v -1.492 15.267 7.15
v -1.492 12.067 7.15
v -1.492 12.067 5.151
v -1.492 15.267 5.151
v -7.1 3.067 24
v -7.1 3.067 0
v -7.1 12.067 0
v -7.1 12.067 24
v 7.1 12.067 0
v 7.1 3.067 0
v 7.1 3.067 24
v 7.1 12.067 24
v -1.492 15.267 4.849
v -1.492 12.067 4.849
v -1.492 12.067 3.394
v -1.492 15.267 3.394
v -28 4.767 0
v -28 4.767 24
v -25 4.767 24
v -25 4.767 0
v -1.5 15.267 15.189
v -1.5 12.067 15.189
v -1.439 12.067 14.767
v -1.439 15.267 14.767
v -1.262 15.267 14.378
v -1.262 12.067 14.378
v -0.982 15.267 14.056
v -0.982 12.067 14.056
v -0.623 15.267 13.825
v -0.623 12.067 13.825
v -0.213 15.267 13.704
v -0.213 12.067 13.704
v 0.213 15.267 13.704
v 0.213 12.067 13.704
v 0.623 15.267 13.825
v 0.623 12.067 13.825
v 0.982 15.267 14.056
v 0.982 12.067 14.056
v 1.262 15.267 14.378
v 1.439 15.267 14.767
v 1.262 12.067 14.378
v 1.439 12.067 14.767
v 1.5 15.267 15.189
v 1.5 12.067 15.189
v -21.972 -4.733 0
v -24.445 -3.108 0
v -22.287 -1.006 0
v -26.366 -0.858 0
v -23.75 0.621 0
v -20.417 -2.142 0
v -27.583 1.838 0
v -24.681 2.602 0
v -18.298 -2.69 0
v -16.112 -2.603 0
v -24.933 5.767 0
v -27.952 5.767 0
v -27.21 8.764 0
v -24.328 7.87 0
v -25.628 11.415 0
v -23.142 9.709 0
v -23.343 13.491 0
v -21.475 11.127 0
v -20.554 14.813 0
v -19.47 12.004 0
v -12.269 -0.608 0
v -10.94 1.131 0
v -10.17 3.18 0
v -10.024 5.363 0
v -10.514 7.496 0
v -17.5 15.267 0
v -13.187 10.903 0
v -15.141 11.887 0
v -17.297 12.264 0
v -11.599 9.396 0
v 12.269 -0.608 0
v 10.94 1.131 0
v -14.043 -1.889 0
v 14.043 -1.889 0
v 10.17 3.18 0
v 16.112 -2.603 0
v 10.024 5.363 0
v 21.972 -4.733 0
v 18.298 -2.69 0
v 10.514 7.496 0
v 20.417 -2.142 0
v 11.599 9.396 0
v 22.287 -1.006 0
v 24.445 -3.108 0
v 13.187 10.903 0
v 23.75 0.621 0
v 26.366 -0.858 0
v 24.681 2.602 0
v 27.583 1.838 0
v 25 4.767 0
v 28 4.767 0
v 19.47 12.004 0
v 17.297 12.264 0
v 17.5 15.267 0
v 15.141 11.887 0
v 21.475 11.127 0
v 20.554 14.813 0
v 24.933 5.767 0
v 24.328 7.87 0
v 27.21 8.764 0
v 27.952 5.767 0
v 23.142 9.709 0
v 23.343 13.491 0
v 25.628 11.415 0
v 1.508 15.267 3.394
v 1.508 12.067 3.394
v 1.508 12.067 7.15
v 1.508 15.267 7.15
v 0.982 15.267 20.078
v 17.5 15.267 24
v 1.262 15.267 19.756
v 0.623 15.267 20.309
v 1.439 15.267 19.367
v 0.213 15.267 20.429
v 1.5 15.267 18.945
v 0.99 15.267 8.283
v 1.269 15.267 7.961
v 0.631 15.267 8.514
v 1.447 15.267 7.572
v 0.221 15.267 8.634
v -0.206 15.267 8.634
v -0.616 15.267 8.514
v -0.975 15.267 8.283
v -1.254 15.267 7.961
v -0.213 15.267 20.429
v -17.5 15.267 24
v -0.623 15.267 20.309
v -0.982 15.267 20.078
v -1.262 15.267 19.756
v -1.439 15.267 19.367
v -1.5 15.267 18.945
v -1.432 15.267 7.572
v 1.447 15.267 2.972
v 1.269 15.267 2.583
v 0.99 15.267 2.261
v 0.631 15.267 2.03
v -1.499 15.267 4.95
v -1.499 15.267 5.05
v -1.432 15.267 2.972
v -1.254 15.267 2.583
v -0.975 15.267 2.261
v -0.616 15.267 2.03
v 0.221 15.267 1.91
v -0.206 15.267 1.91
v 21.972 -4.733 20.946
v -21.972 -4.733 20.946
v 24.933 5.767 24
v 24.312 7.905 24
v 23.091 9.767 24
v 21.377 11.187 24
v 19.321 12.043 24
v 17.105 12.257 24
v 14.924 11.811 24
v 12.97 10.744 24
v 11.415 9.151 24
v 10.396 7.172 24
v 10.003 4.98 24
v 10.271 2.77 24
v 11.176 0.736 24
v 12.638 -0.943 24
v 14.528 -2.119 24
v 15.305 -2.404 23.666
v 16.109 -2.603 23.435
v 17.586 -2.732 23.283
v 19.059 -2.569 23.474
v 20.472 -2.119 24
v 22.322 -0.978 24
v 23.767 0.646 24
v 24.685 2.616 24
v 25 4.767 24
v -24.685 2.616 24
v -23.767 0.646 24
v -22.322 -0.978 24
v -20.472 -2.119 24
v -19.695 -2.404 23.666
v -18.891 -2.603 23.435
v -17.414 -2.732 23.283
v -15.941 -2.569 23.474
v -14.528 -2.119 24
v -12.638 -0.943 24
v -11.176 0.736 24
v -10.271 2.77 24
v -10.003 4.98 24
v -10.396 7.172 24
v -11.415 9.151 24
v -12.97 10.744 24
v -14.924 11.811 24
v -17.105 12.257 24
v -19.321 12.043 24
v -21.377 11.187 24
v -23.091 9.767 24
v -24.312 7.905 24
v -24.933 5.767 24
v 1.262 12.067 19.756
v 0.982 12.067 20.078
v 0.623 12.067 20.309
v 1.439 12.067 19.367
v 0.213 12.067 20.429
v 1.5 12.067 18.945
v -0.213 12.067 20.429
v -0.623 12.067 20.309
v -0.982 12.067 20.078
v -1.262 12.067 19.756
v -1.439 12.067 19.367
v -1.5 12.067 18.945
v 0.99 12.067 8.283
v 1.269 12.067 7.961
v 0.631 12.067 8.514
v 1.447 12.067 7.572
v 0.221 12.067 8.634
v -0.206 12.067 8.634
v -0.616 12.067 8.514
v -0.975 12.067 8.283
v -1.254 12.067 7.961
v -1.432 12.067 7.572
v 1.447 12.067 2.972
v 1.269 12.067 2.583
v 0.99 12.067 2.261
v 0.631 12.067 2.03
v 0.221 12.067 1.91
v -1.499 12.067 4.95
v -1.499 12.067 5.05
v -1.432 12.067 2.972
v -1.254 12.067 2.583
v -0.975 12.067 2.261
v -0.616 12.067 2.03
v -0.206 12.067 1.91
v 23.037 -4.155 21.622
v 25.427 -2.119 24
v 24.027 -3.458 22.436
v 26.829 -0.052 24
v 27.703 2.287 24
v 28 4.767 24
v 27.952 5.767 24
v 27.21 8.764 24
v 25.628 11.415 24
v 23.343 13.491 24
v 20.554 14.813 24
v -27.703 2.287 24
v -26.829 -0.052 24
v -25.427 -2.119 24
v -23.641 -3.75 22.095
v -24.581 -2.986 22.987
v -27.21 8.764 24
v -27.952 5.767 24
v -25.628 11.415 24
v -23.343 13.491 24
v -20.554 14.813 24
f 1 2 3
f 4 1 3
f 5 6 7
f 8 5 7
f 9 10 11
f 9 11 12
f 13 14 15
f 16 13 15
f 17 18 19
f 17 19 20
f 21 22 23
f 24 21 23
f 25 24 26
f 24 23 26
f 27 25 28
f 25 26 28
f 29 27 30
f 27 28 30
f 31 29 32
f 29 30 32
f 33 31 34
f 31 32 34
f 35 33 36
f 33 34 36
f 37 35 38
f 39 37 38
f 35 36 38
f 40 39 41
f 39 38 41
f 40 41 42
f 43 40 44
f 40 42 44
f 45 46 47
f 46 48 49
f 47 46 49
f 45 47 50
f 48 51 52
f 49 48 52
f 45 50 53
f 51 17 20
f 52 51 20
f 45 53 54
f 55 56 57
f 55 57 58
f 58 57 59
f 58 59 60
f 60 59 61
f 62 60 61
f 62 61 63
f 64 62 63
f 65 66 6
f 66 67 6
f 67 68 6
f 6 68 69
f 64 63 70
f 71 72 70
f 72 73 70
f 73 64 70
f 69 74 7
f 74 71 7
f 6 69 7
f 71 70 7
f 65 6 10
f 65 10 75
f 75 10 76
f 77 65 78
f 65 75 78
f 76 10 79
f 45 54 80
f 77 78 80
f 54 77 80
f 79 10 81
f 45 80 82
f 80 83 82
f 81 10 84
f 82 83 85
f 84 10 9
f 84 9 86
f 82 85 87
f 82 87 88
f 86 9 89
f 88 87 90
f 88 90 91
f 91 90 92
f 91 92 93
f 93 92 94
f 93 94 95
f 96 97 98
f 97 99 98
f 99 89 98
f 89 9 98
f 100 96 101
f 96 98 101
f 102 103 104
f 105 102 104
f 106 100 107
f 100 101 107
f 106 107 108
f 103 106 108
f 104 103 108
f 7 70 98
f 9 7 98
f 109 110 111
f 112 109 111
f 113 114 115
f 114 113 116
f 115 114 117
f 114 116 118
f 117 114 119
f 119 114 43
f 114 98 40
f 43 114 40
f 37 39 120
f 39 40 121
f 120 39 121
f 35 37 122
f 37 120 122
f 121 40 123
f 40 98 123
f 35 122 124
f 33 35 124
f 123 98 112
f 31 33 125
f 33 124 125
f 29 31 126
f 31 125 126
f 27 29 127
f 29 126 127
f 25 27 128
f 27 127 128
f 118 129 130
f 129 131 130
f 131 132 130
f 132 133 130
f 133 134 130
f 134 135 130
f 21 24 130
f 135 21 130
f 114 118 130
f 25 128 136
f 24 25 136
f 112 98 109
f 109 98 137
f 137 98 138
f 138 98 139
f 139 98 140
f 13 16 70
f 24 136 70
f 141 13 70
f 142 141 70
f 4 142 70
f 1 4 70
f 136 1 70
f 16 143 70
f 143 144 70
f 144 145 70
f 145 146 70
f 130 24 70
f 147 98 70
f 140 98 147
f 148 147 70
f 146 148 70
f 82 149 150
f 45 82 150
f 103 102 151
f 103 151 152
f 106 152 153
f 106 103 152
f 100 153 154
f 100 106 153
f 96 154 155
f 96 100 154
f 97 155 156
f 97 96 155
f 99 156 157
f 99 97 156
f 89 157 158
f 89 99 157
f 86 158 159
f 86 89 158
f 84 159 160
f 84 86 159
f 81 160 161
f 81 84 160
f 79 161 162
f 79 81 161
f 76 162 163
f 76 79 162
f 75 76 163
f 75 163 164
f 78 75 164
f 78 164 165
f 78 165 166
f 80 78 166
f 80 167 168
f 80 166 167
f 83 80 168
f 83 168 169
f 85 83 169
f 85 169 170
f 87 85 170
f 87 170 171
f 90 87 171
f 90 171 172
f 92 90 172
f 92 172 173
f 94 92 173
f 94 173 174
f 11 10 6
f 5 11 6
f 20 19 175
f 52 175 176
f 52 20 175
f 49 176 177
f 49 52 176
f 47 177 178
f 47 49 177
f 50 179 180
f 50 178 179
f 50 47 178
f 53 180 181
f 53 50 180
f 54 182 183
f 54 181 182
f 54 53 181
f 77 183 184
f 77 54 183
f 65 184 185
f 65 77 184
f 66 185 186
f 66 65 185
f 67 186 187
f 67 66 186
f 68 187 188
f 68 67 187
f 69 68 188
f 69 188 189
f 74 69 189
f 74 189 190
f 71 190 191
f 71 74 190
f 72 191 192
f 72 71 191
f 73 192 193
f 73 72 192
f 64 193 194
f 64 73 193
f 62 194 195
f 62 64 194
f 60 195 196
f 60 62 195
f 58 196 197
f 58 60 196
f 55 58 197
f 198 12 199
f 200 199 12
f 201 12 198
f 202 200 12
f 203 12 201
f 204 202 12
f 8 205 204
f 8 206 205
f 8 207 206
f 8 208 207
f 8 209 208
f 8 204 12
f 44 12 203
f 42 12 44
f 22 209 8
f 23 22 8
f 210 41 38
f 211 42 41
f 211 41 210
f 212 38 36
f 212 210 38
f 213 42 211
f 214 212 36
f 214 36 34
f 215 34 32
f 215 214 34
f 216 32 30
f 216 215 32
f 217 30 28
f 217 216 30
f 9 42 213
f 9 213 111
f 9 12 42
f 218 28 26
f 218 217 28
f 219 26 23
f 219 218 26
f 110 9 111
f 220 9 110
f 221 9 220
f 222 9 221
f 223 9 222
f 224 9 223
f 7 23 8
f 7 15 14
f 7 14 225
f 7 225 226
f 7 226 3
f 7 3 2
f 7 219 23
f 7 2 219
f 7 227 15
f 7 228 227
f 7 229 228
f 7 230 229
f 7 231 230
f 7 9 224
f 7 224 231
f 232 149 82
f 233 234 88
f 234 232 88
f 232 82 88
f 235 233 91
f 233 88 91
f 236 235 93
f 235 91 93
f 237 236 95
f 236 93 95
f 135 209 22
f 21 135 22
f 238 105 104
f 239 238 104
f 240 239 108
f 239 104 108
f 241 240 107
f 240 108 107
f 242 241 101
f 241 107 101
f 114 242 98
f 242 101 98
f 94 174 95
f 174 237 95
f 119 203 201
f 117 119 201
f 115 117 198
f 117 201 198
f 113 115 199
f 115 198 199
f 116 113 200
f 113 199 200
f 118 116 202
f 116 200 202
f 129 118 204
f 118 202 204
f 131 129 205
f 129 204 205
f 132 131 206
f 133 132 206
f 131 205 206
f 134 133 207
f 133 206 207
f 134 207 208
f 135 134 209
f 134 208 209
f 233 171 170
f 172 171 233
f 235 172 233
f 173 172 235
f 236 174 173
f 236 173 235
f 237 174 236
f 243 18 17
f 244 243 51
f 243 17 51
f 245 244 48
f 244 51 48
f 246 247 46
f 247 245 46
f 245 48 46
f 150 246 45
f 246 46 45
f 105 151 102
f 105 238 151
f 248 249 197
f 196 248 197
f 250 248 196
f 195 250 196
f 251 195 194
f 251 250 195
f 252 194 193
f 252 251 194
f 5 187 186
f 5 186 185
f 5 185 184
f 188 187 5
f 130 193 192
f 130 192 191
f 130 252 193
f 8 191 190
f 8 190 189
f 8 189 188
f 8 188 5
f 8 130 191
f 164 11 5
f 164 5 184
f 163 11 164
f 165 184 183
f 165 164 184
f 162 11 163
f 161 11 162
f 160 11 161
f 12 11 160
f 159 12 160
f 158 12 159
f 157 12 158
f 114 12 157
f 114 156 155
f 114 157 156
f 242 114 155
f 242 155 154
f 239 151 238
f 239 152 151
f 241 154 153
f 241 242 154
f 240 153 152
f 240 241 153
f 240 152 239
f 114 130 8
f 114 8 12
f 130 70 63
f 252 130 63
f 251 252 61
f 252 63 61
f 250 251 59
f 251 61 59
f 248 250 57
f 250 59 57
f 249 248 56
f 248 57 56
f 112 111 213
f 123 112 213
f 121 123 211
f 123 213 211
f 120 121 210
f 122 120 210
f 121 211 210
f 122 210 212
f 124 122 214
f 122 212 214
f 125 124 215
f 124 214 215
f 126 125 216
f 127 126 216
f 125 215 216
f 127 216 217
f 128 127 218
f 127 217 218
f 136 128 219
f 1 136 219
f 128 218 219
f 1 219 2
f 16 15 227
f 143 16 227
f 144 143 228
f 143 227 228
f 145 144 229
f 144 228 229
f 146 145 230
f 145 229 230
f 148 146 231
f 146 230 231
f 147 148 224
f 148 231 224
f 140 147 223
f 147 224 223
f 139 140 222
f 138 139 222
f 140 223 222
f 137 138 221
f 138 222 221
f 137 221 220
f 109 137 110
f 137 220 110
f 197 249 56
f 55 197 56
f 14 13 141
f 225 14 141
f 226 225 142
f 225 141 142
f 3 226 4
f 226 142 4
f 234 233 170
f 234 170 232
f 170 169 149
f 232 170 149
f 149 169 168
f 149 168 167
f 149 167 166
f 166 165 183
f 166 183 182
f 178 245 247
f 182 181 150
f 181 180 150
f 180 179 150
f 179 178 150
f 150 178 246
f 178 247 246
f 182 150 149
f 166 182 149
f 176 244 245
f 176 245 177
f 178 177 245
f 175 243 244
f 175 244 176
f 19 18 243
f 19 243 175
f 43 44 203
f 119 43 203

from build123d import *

# Parameters (mm, degrees)
SKETCH2_R               = 7.5
BOSS_EXTRUDE1_DEPTH     = 24
CUT_EXTRUDE2_DEPTH      = 40.913473307
CUT_EXTRUDE2_DEPTH_BACK = 40.913473307
SKETCH5_W               = 68.617197106
SKETCH5_H               = 1
SKETCH6_W               = 14.2
SKETCH6_H               = 9
CUT_EXTRUDE4_DEPTH      = 40.913473307
SKETCH7_R               = 1.5
CUT_EXTRUDE5_DEPTH      = 7
CUT_EXTRUDE6_DEPTH      = 40.913473307
CUT_EXTRUDE6_DEPTH_BACK = 40.913473307
SKETCH9_W               = 33.569510153
SKETCH9_H               = 1
CUT_EXTRUDE7_DEPTH      = 10
CUT_EXTRUDE8_DEPTH      = 42.952353927
CUT_EXTRUDE8_DEPTH_BACK = 6


with BuildPart() as part:
    # Sketch2 → Boss-Extrude1 (new body)
    with BuildSketch(Plane.XY):
        with BuildLine():
            Line((-17.5, -5.732866955), (-5, -5.732866955))
            Line((-5, -5.732866955), (17.5, -5.732866955))
            ThreePointArc((17.5, -5.732866955), (28, 4.767133045), (17.5, 15.267133045))
            Line((17.5, 15.267133045), (-17.5, 15.267133045))
            ThreePointArc((-17.5, 15.267133045), (-28, 4.767133045), (-17.5, -5.732866955))
        make_face()
        with Locations((-17.5, 4.767133045)):
            Circle(SKETCH2_R, mode=Mode.SUBTRACT)
        with Locations((17.5, 4.767133045)):
            Circle(SKETCH2_R, mode=Mode.SUBTRACT)
    extrude(amount=BOSS_EXTRUDE1_DEPTH)

    # Sketch5 → Cut-Extrude2 (cut, two sides: drawn at the far end of the back side and taken through both)
    with BuildSketch(Plane(origin=(0, 0, 0), x_dir=(-1, 0, 0), z_dir=(0, 0, -1)).offset(-CUT_EXTRUDE2_DEPTH_BACK)):
        with Locations((-5.849443293, -5.232866955)):
            Rectangle(SKETCH5_W, SKETCH5_H)
    extrude(amount=CUT_EXTRUDE2_DEPTH + CUT_EXTRUDE2_DEPTH_BACK, mode=Mode.SUBTRACT)

    # Sketch6 → Cut-Extrude4 (cut, through all)
    with BuildSketch(Plane(origin=(0, 0, 0), x_dir=(-1, 0, 0), z_dir=(0, 0, -1))):
        with Locations((0, 7.567133045)):
            Rectangle(SKETCH6_W, SKETCH6_H)
    extrude(amount=-CUT_EXTRUDE4_DEPTH, mode=Mode.SUBTRACT)

    # Sketch7 → Cut-Extrude5 (cut)
    with BuildSketch(Plane(origin=(0, 15.267133045, 0), x_dir=(1, 0, 0), z_dir=(0, 1, 0))):
        with Locations(Location((0, -5, 0), (0, 0, 270))):
            Circle(SKETCH7_R)
        with Locations(Location((0, -17, 0), (0, 0, 270))):
            Circle(SKETCH7_R)
    extrude(amount=-CUT_EXTRUDE5_DEPTH, mode=Mode.SUBTRACT)

    # Sketch8 → Cut-Extrude6 (cut, two sides: drawn at the far end of the back side and taken through both)
    with BuildSketch(Plane(origin=(0, 0, 0), x_dir=(0, 0, -1), z_dir=(1, 0, 0)).offset(-CUT_EXTRUDE6_DEPTH_BACK)):
        Polygon((-26.475275498, 0), (-18.93282628, -6.456635217), (-28.387151922, -5.921555858), align=None)
    extrude(amount=CUT_EXTRUDE6_DEPTH + CUT_EXTRUDE6_DEPTH_BACK, mode=Mode.SUBTRACT)

    # Sketch9 → Cut-Extrude7 (cut)
    with BuildSketch(Plane(origin=(30, 0, 0), x_dir=(0, 0, -1), z_dir=(1, 0, 0))):
        with Locations((-12.766874728, 5.267133045)):
            Rectangle(SKETCH9_W, SKETCH9_H)
    cut_extrude7 = extrude(amount=-CUT_EXTRUDE7_DEPTH, mode=Mode.SUBTRACT)

    # Mirror1: Cut-Extrude7 across plane
    add(cut_extrude7.mirror(Plane(origin=(0, 0, 0), x_dir=(0, 0, 1), z_dir=(1, 0, 0))), mode=Mode.SUBTRACT)

    # Sketch11 → Cut-Extrude8 (cut, two sides: drawn at the far end of the back side and taken through both)
    with BuildSketch(Plane(origin=(0, 15.267133045, 0), x_dir=(1, 0, 0), z_dir=(0, 1, 0)).offset(-CUT_EXTRUDE8_DEPTH_BACK)):
        with BuildLine():
            Line((-1.5, -18.944592398), (-1.5, -15.189153247))
            ThreePointArc((-1.5, -15.189153247), (0, -13.689153247), (1.5, -15.189153247))
            Line((1.5, -15.189153247), (1.5, -18.944592398))
            ThreePointArc((1.5, -18.944592398), (0, -20.444592398), (-1.5, -18.944592398))
        make_face()
        with BuildLine():
            Line((-1.492419394, -7.149757539), (-1.492419394, -3.394318388))
            ThreePointArc((-1.492419394, -3.394318388), (0.007580606, -1.894318388), (1.507580606, -3.394318388))
            Line((1.507580606, -3.394318388), (1.507580606, -7.149757539))
            ThreePointArc((1.507580606, -7.149757539), (0.007580606, -8.649757539), (-1.492419394, -7.149757539))
        make_face()
    extrude(amount=CUT_EXTRUDE8_DEPTH + CUT_EXTRUDE8_DEPTH_BACK, mode=Mode.SUBTRACT)


solid = part.part
